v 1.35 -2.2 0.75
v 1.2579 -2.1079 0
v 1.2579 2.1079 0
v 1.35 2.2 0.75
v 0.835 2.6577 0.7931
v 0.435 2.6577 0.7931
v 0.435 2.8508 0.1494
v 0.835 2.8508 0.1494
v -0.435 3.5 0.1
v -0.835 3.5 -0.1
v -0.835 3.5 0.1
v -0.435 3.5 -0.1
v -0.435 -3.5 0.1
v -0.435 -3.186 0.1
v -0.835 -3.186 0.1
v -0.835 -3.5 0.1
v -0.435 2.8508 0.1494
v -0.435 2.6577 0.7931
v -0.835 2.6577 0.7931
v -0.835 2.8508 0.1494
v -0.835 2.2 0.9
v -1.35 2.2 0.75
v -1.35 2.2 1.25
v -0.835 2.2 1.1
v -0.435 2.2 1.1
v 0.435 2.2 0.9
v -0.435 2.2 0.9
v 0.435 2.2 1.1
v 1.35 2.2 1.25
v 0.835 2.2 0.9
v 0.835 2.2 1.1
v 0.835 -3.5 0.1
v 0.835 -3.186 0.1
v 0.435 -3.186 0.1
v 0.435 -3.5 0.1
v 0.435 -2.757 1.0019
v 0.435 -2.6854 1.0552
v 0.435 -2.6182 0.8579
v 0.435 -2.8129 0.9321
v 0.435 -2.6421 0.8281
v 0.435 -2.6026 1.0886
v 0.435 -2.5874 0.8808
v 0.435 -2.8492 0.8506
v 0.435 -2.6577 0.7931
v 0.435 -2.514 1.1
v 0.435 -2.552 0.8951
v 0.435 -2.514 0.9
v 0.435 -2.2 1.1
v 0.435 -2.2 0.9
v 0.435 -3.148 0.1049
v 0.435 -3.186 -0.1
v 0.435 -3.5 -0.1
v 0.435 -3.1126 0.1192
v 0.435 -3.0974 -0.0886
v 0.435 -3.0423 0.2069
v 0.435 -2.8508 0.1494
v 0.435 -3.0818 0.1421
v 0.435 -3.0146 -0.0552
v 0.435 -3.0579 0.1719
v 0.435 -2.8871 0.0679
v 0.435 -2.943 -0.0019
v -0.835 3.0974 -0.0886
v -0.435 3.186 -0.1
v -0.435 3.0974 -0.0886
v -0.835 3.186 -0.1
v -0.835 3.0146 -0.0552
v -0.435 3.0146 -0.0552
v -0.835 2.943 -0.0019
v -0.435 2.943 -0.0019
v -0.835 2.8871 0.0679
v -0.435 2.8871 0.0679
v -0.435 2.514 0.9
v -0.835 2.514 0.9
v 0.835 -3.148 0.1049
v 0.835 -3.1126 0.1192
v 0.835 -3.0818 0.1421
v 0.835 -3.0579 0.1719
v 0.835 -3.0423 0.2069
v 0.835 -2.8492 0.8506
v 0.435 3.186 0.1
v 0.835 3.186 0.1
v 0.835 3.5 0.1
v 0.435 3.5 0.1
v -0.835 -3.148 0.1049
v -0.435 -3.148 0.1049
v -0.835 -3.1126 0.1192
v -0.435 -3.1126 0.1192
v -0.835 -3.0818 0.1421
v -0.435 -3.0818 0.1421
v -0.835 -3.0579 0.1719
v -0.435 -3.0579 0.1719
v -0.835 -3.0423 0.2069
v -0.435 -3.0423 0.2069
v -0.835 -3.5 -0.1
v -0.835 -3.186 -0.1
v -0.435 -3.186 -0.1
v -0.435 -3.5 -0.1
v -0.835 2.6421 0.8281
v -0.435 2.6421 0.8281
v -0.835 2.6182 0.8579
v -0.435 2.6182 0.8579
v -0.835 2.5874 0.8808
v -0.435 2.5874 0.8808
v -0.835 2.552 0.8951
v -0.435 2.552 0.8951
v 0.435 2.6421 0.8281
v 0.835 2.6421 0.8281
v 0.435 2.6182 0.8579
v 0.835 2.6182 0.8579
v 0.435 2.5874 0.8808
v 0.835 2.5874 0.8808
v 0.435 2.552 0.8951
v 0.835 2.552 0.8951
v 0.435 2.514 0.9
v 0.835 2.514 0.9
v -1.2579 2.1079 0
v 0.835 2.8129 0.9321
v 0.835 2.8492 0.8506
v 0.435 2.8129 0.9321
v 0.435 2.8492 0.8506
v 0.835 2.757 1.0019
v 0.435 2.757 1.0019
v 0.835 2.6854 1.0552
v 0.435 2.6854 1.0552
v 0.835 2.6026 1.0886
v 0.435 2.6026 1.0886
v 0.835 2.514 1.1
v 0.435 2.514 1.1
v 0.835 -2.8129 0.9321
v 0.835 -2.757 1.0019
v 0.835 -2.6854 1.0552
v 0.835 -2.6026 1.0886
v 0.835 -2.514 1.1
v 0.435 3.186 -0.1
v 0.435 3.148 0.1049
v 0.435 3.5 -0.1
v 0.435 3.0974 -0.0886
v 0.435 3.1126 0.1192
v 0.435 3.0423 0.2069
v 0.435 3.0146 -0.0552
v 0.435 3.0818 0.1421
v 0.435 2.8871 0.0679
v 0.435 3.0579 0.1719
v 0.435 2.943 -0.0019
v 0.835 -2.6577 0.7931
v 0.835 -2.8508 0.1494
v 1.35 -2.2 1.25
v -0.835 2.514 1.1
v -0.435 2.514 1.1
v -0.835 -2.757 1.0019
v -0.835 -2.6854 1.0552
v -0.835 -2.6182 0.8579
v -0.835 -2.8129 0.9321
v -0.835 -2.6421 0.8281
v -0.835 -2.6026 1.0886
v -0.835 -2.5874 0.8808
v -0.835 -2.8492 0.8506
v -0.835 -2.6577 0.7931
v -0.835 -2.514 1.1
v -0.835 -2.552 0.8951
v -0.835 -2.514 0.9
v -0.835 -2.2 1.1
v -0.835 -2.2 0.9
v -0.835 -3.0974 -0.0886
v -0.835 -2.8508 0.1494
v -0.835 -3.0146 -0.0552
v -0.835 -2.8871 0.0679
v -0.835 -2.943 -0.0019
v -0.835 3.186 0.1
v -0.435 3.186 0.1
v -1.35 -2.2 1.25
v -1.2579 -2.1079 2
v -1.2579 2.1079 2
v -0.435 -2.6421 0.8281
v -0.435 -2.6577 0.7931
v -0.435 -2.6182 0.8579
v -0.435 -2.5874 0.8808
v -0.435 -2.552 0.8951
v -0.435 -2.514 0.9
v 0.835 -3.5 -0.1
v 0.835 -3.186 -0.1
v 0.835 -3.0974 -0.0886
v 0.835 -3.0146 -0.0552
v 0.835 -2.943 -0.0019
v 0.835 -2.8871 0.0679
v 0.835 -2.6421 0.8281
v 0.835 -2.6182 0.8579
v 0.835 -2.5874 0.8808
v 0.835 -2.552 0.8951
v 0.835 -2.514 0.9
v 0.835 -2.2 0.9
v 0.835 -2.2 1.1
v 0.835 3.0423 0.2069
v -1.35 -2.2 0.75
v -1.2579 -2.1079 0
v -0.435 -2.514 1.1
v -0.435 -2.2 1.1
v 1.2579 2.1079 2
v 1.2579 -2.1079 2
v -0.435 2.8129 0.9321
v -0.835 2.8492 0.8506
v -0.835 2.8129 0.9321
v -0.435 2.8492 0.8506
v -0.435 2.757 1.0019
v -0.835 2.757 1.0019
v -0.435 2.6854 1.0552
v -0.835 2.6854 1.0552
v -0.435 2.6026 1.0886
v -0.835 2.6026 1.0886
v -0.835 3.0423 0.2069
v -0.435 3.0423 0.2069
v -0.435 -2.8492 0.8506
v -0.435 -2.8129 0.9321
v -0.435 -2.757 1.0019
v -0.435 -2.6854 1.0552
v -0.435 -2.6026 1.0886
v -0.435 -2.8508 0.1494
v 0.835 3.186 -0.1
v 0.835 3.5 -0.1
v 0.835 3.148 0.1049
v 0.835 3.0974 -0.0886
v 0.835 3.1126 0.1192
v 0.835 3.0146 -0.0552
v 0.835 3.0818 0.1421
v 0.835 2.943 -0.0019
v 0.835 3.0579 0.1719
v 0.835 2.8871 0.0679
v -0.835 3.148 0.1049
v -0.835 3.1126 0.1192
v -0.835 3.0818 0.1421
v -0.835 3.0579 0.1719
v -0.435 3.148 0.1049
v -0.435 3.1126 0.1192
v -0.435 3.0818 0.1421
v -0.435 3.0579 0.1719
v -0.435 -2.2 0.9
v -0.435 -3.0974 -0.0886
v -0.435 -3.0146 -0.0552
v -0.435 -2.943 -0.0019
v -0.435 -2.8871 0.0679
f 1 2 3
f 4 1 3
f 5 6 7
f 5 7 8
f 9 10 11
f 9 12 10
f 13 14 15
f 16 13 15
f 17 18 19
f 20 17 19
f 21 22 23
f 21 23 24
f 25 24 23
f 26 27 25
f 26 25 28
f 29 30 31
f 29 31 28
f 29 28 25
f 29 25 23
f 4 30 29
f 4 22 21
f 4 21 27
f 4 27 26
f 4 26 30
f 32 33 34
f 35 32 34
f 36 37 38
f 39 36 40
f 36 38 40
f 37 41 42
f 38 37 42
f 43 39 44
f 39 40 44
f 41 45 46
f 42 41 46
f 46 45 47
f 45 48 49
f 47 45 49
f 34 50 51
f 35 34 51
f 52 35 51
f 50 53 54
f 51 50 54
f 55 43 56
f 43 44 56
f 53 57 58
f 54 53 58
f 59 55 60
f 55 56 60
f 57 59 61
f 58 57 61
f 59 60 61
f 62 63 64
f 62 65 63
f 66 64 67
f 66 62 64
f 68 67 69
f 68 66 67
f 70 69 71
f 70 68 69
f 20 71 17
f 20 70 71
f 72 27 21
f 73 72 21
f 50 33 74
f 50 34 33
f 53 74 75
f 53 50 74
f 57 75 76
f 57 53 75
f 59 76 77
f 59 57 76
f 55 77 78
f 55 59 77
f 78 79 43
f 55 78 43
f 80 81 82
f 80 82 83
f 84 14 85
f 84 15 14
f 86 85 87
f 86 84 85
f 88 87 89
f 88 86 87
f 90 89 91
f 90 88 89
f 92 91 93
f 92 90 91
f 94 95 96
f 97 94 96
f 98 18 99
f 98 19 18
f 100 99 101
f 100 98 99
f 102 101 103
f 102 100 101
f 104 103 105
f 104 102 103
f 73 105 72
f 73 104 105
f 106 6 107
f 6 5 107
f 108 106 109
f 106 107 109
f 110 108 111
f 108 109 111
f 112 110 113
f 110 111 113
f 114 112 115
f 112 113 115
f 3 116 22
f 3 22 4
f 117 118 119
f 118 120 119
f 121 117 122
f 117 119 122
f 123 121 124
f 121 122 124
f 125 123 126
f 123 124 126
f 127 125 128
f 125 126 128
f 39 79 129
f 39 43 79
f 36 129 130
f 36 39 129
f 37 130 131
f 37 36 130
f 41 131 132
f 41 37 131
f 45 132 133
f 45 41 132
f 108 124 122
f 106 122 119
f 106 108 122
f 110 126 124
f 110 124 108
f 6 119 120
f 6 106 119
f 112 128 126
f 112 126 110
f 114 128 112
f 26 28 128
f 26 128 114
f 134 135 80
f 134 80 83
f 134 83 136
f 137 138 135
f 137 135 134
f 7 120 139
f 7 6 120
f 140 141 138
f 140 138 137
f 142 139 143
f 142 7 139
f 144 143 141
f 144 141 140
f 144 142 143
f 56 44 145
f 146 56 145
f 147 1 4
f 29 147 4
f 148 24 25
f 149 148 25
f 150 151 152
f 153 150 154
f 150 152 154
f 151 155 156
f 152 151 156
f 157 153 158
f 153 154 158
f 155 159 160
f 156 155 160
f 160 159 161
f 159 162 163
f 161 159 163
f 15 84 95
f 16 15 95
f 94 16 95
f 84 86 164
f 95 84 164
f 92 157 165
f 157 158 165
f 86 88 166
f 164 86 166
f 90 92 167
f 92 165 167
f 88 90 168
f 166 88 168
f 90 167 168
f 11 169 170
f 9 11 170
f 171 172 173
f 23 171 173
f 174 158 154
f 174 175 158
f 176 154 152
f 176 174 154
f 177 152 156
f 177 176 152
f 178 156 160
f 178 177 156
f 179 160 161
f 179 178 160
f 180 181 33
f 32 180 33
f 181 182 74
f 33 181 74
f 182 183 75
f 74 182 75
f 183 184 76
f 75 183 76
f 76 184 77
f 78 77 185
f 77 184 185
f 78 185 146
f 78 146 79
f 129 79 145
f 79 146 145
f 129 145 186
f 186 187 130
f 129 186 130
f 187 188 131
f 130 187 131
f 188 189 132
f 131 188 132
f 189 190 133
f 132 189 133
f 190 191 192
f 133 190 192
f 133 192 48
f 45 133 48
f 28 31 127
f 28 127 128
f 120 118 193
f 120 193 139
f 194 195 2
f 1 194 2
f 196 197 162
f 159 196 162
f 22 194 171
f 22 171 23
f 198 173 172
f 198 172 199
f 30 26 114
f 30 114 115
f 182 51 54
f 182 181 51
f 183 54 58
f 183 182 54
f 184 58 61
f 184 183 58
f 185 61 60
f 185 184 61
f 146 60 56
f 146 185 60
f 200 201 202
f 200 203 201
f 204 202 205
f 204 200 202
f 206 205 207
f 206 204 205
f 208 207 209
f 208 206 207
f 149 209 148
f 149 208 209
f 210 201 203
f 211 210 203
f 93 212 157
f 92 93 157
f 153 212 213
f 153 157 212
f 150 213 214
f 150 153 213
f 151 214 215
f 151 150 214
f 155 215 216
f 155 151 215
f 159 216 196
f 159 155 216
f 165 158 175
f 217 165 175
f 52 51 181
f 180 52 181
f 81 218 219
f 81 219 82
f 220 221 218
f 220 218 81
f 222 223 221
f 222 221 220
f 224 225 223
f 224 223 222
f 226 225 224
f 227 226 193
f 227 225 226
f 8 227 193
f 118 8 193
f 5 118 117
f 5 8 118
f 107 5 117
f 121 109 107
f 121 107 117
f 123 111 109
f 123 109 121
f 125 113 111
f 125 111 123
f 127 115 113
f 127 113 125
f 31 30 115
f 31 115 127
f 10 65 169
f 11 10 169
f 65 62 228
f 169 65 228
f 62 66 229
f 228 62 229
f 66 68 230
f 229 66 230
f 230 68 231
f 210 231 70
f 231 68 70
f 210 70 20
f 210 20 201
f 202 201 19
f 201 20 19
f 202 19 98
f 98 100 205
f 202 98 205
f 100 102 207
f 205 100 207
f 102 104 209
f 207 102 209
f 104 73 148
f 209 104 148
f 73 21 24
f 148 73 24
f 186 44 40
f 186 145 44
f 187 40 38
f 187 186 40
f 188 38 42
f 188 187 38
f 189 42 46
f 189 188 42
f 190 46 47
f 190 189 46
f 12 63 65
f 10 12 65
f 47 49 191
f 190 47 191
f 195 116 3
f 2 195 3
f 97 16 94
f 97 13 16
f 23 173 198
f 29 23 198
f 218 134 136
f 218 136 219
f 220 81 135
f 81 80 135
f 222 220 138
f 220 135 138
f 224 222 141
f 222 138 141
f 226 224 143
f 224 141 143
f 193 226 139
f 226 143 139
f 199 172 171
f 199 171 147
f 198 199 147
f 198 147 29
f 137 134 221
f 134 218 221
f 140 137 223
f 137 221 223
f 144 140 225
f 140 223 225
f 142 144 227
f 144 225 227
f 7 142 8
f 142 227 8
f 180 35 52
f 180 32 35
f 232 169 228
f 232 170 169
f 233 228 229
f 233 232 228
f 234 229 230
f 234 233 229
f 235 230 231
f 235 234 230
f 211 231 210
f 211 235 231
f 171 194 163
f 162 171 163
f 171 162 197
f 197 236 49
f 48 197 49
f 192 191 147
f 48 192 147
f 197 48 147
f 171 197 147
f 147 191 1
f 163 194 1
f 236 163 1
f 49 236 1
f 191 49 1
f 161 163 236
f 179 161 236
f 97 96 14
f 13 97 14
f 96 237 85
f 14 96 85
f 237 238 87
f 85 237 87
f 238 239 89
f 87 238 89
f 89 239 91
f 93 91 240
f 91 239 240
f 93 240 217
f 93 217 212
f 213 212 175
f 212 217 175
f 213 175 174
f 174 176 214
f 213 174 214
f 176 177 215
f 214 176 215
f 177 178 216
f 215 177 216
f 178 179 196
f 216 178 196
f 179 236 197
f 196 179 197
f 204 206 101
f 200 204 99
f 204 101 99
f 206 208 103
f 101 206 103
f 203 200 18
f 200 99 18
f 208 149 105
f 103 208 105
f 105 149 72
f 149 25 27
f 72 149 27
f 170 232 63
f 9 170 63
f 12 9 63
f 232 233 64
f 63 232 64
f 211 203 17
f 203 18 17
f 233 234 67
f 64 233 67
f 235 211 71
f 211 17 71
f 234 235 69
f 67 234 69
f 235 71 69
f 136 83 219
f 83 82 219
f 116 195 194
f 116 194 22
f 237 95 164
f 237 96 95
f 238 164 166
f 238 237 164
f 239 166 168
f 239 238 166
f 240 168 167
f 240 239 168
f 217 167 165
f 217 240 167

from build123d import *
from OCP.BRepFilletAPI import BRepFilletAPI_MakeChamfer

# Parameters (mm, degrees)
SKETCH_1_W               = 2.7
SKETCH_1_H               = 4.4
EXTRUDE_1_DEPTH          = 2
CHAMFER_1_SIZE           = 0.75
CHAMFER_1_SIZE2          = 0.092088421
SKETCH_2_W               = 0.4
SKETCH_2_H               = 0.2
PATTERN_LINEAR_1_COUNT   = 2
PATTERN_LINEAR_1_PITCH   = 1.27
MIRROR_1_COPY_1_SKETCH_W = 0.4
MIRROR_1_COPY_1_SKETCH_H = 0.2


with BuildPart() as part:
    # 草图1 → 凸台-拉伸1 (new body)
    with BuildSketch(Plane.XY):
        Rectangle(SKETCH_1_W, SKETCH_1_H)
    extrude(amount=EXTRUDE_1_DEPTH)

    # 倒角1: one chamfer whose edges measure the first distance from different faces: ONE call of the kernel's chamfer builder (chamfer() names one face for all edges)
    chamfer_1_edges_1 = [part.edges().sort_by_distance(p)[0] for p in [
        (-1.35, 0, 2),
        (-1.35, 0, 0),
    ]]
    chamfer_1_side_1 = [part.faces().sort_by_distance(p)[0] for p in [
        (-1.35, 0, 1),
    ]]
    chamfer_1_edges_2 = [part.edges().sort_by_distance(p)[0] for p in [
        (0, -2.2, 2),
        (0, -2.2, 0),
    ]]
    chamfer_1_side_2 = [part.faces().sort_by_distance(p)[0] for p in [
        (0, -2.2, 1),
    ]]
    chamfer_1_edges_3 = [part.edges().sort_by_distance(p)[0] for p in [
        (1.35, 0, 2),
        (1.35, 0, 0),
    ]]
    chamfer_1_side_3 = [part.faces().sort_by_distance(p)[0] for p in [
        (1.35, 0, 1),
    ]]
    chamfer_1_edges_4 = [part.edges().sort_by_distance(p)[0] for p in [
        (0, 2.2, 0),
        (0, 2.2, 2),
    ]]
    chamfer_1_side_4 = [part.faces().sort_by_distance(p)[0] for p in [
        (0, 2.2, 1),
    ]]
    chamfer_1 = BRepFilletAPI_MakeChamfer(part.part.solid().wrapped)
    for e in chamfer_1_edges_1:
        chamfer_1.Add(CHAMFER_1_SIZE, CHAMFER_1_SIZE2, e.wrapped, chamfer_1_side_1[0].wrapped)  # the first distance lies on this face
    for e in chamfer_1_edges_2:
        chamfer_1.Add(CHAMFER_1_SIZE, CHAMFER_1_SIZE2, e.wrapped, chamfer_1_side_2[0].wrapped)  # the first distance lies on this face
    for e in chamfer_1_edges_3:
        chamfer_1.Add(CHAMFER_1_SIZE, CHAMFER_1_SIZE2, e.wrapped, chamfer_1_side_3[0].wrapped)  # the first distance lies on this face
    for e in chamfer_1_edges_4:
        chamfer_1.Add(CHAMFER_1_SIZE, CHAMFER_1_SIZE2, e.wrapped, chamfer_1_side_4[0].wrapped)  # the first distance lies on this face
    add(Compound.cast(chamfer_1.Shape()), mode=Mode.REPLACE)

    # 扫描1: sweep along a path in 草图3
    with BuildLine(Plane(origin=(0, 0, 0), x_dir=(0, 0, -1), z_dir=(1, 0, 0))) as sweep_1_path:
        Line((0, -3.5), (0, -3.186007663))
        ThreePointArc((0, -3.186007663), (-0.049426768, -3.03677503), (-0.178163029, -2.946551091))
        Line((-0.178163029, -2.946551091), (-0.821836971, -2.753448909))
        ThreePointArc((-0.821836971, -2.753448909), (-0.950573232, -2.66322497), (-1, -2.513992337))
        Line((-1, -2.513992337), (-1, -2.2))
    # 草图2 → 扫描1 (sweep)
    with BuildSketch(Plane.XZ.offset(2.2)):
        with Locations((0.635, 1)):
            Rectangle(SKETCH_2_W, SKETCH_2_H)
    sweep_1 = sweep(path=sweep_1_path.line)

    # 阵列(线性)1: 扫描1 ×2
    with Locations(*[(-i * PATTERN_LINEAR_1_PITCH, 0, 0) for i in range(1, PATTERN_LINEAR_1_COUNT)]):
        add(sweep_1)

    # 镜向1: 扫描1 across plane
    add(sweep_1.mirror(Plane.ZX))

    # 镜向1 copy 1: sweep along a path in 镜向1 copy 1 path
    with BuildLine(Plane(origin=(-1.27, 0, 0), x_dir=(0, 0, -1), z_dir=(1, 0, 0))) as mirror_1_copy_1_path:
        Line((0, 3.5), (0, 3.186007663))
        ThreePointArc((0, 3.186007663), (-0.049426768, 3.03677503), (-0.178163029, 2.946551091))
        Line((-0.178163029, 2.946551091), (-0.821836971, 2.753448909))
        ThreePointArc((-0.821836971, 2.753448909), (-0.950573232, 2.66322497), (-1, 2.513992337))
        Line((-1, 2.513992337), (-1, 2.2))
    # 镜向1 copy 1 sketch → 镜向1 copy 1 (sweep)
    with BuildSketch(Plane(origin=(-1.27, 2.2, 0), x_dir=(1, 0, 0), z_dir=(0, 1, 0))):
        with Locations((0.635, -1)):
            Rectangle(MIRROR_1_COPY_1_SKETCH_W, MIRROR_1_COPY_1_SKETCH_H)
    sweep(path=mirror_1_copy_1_path.line)


solid = part.part
